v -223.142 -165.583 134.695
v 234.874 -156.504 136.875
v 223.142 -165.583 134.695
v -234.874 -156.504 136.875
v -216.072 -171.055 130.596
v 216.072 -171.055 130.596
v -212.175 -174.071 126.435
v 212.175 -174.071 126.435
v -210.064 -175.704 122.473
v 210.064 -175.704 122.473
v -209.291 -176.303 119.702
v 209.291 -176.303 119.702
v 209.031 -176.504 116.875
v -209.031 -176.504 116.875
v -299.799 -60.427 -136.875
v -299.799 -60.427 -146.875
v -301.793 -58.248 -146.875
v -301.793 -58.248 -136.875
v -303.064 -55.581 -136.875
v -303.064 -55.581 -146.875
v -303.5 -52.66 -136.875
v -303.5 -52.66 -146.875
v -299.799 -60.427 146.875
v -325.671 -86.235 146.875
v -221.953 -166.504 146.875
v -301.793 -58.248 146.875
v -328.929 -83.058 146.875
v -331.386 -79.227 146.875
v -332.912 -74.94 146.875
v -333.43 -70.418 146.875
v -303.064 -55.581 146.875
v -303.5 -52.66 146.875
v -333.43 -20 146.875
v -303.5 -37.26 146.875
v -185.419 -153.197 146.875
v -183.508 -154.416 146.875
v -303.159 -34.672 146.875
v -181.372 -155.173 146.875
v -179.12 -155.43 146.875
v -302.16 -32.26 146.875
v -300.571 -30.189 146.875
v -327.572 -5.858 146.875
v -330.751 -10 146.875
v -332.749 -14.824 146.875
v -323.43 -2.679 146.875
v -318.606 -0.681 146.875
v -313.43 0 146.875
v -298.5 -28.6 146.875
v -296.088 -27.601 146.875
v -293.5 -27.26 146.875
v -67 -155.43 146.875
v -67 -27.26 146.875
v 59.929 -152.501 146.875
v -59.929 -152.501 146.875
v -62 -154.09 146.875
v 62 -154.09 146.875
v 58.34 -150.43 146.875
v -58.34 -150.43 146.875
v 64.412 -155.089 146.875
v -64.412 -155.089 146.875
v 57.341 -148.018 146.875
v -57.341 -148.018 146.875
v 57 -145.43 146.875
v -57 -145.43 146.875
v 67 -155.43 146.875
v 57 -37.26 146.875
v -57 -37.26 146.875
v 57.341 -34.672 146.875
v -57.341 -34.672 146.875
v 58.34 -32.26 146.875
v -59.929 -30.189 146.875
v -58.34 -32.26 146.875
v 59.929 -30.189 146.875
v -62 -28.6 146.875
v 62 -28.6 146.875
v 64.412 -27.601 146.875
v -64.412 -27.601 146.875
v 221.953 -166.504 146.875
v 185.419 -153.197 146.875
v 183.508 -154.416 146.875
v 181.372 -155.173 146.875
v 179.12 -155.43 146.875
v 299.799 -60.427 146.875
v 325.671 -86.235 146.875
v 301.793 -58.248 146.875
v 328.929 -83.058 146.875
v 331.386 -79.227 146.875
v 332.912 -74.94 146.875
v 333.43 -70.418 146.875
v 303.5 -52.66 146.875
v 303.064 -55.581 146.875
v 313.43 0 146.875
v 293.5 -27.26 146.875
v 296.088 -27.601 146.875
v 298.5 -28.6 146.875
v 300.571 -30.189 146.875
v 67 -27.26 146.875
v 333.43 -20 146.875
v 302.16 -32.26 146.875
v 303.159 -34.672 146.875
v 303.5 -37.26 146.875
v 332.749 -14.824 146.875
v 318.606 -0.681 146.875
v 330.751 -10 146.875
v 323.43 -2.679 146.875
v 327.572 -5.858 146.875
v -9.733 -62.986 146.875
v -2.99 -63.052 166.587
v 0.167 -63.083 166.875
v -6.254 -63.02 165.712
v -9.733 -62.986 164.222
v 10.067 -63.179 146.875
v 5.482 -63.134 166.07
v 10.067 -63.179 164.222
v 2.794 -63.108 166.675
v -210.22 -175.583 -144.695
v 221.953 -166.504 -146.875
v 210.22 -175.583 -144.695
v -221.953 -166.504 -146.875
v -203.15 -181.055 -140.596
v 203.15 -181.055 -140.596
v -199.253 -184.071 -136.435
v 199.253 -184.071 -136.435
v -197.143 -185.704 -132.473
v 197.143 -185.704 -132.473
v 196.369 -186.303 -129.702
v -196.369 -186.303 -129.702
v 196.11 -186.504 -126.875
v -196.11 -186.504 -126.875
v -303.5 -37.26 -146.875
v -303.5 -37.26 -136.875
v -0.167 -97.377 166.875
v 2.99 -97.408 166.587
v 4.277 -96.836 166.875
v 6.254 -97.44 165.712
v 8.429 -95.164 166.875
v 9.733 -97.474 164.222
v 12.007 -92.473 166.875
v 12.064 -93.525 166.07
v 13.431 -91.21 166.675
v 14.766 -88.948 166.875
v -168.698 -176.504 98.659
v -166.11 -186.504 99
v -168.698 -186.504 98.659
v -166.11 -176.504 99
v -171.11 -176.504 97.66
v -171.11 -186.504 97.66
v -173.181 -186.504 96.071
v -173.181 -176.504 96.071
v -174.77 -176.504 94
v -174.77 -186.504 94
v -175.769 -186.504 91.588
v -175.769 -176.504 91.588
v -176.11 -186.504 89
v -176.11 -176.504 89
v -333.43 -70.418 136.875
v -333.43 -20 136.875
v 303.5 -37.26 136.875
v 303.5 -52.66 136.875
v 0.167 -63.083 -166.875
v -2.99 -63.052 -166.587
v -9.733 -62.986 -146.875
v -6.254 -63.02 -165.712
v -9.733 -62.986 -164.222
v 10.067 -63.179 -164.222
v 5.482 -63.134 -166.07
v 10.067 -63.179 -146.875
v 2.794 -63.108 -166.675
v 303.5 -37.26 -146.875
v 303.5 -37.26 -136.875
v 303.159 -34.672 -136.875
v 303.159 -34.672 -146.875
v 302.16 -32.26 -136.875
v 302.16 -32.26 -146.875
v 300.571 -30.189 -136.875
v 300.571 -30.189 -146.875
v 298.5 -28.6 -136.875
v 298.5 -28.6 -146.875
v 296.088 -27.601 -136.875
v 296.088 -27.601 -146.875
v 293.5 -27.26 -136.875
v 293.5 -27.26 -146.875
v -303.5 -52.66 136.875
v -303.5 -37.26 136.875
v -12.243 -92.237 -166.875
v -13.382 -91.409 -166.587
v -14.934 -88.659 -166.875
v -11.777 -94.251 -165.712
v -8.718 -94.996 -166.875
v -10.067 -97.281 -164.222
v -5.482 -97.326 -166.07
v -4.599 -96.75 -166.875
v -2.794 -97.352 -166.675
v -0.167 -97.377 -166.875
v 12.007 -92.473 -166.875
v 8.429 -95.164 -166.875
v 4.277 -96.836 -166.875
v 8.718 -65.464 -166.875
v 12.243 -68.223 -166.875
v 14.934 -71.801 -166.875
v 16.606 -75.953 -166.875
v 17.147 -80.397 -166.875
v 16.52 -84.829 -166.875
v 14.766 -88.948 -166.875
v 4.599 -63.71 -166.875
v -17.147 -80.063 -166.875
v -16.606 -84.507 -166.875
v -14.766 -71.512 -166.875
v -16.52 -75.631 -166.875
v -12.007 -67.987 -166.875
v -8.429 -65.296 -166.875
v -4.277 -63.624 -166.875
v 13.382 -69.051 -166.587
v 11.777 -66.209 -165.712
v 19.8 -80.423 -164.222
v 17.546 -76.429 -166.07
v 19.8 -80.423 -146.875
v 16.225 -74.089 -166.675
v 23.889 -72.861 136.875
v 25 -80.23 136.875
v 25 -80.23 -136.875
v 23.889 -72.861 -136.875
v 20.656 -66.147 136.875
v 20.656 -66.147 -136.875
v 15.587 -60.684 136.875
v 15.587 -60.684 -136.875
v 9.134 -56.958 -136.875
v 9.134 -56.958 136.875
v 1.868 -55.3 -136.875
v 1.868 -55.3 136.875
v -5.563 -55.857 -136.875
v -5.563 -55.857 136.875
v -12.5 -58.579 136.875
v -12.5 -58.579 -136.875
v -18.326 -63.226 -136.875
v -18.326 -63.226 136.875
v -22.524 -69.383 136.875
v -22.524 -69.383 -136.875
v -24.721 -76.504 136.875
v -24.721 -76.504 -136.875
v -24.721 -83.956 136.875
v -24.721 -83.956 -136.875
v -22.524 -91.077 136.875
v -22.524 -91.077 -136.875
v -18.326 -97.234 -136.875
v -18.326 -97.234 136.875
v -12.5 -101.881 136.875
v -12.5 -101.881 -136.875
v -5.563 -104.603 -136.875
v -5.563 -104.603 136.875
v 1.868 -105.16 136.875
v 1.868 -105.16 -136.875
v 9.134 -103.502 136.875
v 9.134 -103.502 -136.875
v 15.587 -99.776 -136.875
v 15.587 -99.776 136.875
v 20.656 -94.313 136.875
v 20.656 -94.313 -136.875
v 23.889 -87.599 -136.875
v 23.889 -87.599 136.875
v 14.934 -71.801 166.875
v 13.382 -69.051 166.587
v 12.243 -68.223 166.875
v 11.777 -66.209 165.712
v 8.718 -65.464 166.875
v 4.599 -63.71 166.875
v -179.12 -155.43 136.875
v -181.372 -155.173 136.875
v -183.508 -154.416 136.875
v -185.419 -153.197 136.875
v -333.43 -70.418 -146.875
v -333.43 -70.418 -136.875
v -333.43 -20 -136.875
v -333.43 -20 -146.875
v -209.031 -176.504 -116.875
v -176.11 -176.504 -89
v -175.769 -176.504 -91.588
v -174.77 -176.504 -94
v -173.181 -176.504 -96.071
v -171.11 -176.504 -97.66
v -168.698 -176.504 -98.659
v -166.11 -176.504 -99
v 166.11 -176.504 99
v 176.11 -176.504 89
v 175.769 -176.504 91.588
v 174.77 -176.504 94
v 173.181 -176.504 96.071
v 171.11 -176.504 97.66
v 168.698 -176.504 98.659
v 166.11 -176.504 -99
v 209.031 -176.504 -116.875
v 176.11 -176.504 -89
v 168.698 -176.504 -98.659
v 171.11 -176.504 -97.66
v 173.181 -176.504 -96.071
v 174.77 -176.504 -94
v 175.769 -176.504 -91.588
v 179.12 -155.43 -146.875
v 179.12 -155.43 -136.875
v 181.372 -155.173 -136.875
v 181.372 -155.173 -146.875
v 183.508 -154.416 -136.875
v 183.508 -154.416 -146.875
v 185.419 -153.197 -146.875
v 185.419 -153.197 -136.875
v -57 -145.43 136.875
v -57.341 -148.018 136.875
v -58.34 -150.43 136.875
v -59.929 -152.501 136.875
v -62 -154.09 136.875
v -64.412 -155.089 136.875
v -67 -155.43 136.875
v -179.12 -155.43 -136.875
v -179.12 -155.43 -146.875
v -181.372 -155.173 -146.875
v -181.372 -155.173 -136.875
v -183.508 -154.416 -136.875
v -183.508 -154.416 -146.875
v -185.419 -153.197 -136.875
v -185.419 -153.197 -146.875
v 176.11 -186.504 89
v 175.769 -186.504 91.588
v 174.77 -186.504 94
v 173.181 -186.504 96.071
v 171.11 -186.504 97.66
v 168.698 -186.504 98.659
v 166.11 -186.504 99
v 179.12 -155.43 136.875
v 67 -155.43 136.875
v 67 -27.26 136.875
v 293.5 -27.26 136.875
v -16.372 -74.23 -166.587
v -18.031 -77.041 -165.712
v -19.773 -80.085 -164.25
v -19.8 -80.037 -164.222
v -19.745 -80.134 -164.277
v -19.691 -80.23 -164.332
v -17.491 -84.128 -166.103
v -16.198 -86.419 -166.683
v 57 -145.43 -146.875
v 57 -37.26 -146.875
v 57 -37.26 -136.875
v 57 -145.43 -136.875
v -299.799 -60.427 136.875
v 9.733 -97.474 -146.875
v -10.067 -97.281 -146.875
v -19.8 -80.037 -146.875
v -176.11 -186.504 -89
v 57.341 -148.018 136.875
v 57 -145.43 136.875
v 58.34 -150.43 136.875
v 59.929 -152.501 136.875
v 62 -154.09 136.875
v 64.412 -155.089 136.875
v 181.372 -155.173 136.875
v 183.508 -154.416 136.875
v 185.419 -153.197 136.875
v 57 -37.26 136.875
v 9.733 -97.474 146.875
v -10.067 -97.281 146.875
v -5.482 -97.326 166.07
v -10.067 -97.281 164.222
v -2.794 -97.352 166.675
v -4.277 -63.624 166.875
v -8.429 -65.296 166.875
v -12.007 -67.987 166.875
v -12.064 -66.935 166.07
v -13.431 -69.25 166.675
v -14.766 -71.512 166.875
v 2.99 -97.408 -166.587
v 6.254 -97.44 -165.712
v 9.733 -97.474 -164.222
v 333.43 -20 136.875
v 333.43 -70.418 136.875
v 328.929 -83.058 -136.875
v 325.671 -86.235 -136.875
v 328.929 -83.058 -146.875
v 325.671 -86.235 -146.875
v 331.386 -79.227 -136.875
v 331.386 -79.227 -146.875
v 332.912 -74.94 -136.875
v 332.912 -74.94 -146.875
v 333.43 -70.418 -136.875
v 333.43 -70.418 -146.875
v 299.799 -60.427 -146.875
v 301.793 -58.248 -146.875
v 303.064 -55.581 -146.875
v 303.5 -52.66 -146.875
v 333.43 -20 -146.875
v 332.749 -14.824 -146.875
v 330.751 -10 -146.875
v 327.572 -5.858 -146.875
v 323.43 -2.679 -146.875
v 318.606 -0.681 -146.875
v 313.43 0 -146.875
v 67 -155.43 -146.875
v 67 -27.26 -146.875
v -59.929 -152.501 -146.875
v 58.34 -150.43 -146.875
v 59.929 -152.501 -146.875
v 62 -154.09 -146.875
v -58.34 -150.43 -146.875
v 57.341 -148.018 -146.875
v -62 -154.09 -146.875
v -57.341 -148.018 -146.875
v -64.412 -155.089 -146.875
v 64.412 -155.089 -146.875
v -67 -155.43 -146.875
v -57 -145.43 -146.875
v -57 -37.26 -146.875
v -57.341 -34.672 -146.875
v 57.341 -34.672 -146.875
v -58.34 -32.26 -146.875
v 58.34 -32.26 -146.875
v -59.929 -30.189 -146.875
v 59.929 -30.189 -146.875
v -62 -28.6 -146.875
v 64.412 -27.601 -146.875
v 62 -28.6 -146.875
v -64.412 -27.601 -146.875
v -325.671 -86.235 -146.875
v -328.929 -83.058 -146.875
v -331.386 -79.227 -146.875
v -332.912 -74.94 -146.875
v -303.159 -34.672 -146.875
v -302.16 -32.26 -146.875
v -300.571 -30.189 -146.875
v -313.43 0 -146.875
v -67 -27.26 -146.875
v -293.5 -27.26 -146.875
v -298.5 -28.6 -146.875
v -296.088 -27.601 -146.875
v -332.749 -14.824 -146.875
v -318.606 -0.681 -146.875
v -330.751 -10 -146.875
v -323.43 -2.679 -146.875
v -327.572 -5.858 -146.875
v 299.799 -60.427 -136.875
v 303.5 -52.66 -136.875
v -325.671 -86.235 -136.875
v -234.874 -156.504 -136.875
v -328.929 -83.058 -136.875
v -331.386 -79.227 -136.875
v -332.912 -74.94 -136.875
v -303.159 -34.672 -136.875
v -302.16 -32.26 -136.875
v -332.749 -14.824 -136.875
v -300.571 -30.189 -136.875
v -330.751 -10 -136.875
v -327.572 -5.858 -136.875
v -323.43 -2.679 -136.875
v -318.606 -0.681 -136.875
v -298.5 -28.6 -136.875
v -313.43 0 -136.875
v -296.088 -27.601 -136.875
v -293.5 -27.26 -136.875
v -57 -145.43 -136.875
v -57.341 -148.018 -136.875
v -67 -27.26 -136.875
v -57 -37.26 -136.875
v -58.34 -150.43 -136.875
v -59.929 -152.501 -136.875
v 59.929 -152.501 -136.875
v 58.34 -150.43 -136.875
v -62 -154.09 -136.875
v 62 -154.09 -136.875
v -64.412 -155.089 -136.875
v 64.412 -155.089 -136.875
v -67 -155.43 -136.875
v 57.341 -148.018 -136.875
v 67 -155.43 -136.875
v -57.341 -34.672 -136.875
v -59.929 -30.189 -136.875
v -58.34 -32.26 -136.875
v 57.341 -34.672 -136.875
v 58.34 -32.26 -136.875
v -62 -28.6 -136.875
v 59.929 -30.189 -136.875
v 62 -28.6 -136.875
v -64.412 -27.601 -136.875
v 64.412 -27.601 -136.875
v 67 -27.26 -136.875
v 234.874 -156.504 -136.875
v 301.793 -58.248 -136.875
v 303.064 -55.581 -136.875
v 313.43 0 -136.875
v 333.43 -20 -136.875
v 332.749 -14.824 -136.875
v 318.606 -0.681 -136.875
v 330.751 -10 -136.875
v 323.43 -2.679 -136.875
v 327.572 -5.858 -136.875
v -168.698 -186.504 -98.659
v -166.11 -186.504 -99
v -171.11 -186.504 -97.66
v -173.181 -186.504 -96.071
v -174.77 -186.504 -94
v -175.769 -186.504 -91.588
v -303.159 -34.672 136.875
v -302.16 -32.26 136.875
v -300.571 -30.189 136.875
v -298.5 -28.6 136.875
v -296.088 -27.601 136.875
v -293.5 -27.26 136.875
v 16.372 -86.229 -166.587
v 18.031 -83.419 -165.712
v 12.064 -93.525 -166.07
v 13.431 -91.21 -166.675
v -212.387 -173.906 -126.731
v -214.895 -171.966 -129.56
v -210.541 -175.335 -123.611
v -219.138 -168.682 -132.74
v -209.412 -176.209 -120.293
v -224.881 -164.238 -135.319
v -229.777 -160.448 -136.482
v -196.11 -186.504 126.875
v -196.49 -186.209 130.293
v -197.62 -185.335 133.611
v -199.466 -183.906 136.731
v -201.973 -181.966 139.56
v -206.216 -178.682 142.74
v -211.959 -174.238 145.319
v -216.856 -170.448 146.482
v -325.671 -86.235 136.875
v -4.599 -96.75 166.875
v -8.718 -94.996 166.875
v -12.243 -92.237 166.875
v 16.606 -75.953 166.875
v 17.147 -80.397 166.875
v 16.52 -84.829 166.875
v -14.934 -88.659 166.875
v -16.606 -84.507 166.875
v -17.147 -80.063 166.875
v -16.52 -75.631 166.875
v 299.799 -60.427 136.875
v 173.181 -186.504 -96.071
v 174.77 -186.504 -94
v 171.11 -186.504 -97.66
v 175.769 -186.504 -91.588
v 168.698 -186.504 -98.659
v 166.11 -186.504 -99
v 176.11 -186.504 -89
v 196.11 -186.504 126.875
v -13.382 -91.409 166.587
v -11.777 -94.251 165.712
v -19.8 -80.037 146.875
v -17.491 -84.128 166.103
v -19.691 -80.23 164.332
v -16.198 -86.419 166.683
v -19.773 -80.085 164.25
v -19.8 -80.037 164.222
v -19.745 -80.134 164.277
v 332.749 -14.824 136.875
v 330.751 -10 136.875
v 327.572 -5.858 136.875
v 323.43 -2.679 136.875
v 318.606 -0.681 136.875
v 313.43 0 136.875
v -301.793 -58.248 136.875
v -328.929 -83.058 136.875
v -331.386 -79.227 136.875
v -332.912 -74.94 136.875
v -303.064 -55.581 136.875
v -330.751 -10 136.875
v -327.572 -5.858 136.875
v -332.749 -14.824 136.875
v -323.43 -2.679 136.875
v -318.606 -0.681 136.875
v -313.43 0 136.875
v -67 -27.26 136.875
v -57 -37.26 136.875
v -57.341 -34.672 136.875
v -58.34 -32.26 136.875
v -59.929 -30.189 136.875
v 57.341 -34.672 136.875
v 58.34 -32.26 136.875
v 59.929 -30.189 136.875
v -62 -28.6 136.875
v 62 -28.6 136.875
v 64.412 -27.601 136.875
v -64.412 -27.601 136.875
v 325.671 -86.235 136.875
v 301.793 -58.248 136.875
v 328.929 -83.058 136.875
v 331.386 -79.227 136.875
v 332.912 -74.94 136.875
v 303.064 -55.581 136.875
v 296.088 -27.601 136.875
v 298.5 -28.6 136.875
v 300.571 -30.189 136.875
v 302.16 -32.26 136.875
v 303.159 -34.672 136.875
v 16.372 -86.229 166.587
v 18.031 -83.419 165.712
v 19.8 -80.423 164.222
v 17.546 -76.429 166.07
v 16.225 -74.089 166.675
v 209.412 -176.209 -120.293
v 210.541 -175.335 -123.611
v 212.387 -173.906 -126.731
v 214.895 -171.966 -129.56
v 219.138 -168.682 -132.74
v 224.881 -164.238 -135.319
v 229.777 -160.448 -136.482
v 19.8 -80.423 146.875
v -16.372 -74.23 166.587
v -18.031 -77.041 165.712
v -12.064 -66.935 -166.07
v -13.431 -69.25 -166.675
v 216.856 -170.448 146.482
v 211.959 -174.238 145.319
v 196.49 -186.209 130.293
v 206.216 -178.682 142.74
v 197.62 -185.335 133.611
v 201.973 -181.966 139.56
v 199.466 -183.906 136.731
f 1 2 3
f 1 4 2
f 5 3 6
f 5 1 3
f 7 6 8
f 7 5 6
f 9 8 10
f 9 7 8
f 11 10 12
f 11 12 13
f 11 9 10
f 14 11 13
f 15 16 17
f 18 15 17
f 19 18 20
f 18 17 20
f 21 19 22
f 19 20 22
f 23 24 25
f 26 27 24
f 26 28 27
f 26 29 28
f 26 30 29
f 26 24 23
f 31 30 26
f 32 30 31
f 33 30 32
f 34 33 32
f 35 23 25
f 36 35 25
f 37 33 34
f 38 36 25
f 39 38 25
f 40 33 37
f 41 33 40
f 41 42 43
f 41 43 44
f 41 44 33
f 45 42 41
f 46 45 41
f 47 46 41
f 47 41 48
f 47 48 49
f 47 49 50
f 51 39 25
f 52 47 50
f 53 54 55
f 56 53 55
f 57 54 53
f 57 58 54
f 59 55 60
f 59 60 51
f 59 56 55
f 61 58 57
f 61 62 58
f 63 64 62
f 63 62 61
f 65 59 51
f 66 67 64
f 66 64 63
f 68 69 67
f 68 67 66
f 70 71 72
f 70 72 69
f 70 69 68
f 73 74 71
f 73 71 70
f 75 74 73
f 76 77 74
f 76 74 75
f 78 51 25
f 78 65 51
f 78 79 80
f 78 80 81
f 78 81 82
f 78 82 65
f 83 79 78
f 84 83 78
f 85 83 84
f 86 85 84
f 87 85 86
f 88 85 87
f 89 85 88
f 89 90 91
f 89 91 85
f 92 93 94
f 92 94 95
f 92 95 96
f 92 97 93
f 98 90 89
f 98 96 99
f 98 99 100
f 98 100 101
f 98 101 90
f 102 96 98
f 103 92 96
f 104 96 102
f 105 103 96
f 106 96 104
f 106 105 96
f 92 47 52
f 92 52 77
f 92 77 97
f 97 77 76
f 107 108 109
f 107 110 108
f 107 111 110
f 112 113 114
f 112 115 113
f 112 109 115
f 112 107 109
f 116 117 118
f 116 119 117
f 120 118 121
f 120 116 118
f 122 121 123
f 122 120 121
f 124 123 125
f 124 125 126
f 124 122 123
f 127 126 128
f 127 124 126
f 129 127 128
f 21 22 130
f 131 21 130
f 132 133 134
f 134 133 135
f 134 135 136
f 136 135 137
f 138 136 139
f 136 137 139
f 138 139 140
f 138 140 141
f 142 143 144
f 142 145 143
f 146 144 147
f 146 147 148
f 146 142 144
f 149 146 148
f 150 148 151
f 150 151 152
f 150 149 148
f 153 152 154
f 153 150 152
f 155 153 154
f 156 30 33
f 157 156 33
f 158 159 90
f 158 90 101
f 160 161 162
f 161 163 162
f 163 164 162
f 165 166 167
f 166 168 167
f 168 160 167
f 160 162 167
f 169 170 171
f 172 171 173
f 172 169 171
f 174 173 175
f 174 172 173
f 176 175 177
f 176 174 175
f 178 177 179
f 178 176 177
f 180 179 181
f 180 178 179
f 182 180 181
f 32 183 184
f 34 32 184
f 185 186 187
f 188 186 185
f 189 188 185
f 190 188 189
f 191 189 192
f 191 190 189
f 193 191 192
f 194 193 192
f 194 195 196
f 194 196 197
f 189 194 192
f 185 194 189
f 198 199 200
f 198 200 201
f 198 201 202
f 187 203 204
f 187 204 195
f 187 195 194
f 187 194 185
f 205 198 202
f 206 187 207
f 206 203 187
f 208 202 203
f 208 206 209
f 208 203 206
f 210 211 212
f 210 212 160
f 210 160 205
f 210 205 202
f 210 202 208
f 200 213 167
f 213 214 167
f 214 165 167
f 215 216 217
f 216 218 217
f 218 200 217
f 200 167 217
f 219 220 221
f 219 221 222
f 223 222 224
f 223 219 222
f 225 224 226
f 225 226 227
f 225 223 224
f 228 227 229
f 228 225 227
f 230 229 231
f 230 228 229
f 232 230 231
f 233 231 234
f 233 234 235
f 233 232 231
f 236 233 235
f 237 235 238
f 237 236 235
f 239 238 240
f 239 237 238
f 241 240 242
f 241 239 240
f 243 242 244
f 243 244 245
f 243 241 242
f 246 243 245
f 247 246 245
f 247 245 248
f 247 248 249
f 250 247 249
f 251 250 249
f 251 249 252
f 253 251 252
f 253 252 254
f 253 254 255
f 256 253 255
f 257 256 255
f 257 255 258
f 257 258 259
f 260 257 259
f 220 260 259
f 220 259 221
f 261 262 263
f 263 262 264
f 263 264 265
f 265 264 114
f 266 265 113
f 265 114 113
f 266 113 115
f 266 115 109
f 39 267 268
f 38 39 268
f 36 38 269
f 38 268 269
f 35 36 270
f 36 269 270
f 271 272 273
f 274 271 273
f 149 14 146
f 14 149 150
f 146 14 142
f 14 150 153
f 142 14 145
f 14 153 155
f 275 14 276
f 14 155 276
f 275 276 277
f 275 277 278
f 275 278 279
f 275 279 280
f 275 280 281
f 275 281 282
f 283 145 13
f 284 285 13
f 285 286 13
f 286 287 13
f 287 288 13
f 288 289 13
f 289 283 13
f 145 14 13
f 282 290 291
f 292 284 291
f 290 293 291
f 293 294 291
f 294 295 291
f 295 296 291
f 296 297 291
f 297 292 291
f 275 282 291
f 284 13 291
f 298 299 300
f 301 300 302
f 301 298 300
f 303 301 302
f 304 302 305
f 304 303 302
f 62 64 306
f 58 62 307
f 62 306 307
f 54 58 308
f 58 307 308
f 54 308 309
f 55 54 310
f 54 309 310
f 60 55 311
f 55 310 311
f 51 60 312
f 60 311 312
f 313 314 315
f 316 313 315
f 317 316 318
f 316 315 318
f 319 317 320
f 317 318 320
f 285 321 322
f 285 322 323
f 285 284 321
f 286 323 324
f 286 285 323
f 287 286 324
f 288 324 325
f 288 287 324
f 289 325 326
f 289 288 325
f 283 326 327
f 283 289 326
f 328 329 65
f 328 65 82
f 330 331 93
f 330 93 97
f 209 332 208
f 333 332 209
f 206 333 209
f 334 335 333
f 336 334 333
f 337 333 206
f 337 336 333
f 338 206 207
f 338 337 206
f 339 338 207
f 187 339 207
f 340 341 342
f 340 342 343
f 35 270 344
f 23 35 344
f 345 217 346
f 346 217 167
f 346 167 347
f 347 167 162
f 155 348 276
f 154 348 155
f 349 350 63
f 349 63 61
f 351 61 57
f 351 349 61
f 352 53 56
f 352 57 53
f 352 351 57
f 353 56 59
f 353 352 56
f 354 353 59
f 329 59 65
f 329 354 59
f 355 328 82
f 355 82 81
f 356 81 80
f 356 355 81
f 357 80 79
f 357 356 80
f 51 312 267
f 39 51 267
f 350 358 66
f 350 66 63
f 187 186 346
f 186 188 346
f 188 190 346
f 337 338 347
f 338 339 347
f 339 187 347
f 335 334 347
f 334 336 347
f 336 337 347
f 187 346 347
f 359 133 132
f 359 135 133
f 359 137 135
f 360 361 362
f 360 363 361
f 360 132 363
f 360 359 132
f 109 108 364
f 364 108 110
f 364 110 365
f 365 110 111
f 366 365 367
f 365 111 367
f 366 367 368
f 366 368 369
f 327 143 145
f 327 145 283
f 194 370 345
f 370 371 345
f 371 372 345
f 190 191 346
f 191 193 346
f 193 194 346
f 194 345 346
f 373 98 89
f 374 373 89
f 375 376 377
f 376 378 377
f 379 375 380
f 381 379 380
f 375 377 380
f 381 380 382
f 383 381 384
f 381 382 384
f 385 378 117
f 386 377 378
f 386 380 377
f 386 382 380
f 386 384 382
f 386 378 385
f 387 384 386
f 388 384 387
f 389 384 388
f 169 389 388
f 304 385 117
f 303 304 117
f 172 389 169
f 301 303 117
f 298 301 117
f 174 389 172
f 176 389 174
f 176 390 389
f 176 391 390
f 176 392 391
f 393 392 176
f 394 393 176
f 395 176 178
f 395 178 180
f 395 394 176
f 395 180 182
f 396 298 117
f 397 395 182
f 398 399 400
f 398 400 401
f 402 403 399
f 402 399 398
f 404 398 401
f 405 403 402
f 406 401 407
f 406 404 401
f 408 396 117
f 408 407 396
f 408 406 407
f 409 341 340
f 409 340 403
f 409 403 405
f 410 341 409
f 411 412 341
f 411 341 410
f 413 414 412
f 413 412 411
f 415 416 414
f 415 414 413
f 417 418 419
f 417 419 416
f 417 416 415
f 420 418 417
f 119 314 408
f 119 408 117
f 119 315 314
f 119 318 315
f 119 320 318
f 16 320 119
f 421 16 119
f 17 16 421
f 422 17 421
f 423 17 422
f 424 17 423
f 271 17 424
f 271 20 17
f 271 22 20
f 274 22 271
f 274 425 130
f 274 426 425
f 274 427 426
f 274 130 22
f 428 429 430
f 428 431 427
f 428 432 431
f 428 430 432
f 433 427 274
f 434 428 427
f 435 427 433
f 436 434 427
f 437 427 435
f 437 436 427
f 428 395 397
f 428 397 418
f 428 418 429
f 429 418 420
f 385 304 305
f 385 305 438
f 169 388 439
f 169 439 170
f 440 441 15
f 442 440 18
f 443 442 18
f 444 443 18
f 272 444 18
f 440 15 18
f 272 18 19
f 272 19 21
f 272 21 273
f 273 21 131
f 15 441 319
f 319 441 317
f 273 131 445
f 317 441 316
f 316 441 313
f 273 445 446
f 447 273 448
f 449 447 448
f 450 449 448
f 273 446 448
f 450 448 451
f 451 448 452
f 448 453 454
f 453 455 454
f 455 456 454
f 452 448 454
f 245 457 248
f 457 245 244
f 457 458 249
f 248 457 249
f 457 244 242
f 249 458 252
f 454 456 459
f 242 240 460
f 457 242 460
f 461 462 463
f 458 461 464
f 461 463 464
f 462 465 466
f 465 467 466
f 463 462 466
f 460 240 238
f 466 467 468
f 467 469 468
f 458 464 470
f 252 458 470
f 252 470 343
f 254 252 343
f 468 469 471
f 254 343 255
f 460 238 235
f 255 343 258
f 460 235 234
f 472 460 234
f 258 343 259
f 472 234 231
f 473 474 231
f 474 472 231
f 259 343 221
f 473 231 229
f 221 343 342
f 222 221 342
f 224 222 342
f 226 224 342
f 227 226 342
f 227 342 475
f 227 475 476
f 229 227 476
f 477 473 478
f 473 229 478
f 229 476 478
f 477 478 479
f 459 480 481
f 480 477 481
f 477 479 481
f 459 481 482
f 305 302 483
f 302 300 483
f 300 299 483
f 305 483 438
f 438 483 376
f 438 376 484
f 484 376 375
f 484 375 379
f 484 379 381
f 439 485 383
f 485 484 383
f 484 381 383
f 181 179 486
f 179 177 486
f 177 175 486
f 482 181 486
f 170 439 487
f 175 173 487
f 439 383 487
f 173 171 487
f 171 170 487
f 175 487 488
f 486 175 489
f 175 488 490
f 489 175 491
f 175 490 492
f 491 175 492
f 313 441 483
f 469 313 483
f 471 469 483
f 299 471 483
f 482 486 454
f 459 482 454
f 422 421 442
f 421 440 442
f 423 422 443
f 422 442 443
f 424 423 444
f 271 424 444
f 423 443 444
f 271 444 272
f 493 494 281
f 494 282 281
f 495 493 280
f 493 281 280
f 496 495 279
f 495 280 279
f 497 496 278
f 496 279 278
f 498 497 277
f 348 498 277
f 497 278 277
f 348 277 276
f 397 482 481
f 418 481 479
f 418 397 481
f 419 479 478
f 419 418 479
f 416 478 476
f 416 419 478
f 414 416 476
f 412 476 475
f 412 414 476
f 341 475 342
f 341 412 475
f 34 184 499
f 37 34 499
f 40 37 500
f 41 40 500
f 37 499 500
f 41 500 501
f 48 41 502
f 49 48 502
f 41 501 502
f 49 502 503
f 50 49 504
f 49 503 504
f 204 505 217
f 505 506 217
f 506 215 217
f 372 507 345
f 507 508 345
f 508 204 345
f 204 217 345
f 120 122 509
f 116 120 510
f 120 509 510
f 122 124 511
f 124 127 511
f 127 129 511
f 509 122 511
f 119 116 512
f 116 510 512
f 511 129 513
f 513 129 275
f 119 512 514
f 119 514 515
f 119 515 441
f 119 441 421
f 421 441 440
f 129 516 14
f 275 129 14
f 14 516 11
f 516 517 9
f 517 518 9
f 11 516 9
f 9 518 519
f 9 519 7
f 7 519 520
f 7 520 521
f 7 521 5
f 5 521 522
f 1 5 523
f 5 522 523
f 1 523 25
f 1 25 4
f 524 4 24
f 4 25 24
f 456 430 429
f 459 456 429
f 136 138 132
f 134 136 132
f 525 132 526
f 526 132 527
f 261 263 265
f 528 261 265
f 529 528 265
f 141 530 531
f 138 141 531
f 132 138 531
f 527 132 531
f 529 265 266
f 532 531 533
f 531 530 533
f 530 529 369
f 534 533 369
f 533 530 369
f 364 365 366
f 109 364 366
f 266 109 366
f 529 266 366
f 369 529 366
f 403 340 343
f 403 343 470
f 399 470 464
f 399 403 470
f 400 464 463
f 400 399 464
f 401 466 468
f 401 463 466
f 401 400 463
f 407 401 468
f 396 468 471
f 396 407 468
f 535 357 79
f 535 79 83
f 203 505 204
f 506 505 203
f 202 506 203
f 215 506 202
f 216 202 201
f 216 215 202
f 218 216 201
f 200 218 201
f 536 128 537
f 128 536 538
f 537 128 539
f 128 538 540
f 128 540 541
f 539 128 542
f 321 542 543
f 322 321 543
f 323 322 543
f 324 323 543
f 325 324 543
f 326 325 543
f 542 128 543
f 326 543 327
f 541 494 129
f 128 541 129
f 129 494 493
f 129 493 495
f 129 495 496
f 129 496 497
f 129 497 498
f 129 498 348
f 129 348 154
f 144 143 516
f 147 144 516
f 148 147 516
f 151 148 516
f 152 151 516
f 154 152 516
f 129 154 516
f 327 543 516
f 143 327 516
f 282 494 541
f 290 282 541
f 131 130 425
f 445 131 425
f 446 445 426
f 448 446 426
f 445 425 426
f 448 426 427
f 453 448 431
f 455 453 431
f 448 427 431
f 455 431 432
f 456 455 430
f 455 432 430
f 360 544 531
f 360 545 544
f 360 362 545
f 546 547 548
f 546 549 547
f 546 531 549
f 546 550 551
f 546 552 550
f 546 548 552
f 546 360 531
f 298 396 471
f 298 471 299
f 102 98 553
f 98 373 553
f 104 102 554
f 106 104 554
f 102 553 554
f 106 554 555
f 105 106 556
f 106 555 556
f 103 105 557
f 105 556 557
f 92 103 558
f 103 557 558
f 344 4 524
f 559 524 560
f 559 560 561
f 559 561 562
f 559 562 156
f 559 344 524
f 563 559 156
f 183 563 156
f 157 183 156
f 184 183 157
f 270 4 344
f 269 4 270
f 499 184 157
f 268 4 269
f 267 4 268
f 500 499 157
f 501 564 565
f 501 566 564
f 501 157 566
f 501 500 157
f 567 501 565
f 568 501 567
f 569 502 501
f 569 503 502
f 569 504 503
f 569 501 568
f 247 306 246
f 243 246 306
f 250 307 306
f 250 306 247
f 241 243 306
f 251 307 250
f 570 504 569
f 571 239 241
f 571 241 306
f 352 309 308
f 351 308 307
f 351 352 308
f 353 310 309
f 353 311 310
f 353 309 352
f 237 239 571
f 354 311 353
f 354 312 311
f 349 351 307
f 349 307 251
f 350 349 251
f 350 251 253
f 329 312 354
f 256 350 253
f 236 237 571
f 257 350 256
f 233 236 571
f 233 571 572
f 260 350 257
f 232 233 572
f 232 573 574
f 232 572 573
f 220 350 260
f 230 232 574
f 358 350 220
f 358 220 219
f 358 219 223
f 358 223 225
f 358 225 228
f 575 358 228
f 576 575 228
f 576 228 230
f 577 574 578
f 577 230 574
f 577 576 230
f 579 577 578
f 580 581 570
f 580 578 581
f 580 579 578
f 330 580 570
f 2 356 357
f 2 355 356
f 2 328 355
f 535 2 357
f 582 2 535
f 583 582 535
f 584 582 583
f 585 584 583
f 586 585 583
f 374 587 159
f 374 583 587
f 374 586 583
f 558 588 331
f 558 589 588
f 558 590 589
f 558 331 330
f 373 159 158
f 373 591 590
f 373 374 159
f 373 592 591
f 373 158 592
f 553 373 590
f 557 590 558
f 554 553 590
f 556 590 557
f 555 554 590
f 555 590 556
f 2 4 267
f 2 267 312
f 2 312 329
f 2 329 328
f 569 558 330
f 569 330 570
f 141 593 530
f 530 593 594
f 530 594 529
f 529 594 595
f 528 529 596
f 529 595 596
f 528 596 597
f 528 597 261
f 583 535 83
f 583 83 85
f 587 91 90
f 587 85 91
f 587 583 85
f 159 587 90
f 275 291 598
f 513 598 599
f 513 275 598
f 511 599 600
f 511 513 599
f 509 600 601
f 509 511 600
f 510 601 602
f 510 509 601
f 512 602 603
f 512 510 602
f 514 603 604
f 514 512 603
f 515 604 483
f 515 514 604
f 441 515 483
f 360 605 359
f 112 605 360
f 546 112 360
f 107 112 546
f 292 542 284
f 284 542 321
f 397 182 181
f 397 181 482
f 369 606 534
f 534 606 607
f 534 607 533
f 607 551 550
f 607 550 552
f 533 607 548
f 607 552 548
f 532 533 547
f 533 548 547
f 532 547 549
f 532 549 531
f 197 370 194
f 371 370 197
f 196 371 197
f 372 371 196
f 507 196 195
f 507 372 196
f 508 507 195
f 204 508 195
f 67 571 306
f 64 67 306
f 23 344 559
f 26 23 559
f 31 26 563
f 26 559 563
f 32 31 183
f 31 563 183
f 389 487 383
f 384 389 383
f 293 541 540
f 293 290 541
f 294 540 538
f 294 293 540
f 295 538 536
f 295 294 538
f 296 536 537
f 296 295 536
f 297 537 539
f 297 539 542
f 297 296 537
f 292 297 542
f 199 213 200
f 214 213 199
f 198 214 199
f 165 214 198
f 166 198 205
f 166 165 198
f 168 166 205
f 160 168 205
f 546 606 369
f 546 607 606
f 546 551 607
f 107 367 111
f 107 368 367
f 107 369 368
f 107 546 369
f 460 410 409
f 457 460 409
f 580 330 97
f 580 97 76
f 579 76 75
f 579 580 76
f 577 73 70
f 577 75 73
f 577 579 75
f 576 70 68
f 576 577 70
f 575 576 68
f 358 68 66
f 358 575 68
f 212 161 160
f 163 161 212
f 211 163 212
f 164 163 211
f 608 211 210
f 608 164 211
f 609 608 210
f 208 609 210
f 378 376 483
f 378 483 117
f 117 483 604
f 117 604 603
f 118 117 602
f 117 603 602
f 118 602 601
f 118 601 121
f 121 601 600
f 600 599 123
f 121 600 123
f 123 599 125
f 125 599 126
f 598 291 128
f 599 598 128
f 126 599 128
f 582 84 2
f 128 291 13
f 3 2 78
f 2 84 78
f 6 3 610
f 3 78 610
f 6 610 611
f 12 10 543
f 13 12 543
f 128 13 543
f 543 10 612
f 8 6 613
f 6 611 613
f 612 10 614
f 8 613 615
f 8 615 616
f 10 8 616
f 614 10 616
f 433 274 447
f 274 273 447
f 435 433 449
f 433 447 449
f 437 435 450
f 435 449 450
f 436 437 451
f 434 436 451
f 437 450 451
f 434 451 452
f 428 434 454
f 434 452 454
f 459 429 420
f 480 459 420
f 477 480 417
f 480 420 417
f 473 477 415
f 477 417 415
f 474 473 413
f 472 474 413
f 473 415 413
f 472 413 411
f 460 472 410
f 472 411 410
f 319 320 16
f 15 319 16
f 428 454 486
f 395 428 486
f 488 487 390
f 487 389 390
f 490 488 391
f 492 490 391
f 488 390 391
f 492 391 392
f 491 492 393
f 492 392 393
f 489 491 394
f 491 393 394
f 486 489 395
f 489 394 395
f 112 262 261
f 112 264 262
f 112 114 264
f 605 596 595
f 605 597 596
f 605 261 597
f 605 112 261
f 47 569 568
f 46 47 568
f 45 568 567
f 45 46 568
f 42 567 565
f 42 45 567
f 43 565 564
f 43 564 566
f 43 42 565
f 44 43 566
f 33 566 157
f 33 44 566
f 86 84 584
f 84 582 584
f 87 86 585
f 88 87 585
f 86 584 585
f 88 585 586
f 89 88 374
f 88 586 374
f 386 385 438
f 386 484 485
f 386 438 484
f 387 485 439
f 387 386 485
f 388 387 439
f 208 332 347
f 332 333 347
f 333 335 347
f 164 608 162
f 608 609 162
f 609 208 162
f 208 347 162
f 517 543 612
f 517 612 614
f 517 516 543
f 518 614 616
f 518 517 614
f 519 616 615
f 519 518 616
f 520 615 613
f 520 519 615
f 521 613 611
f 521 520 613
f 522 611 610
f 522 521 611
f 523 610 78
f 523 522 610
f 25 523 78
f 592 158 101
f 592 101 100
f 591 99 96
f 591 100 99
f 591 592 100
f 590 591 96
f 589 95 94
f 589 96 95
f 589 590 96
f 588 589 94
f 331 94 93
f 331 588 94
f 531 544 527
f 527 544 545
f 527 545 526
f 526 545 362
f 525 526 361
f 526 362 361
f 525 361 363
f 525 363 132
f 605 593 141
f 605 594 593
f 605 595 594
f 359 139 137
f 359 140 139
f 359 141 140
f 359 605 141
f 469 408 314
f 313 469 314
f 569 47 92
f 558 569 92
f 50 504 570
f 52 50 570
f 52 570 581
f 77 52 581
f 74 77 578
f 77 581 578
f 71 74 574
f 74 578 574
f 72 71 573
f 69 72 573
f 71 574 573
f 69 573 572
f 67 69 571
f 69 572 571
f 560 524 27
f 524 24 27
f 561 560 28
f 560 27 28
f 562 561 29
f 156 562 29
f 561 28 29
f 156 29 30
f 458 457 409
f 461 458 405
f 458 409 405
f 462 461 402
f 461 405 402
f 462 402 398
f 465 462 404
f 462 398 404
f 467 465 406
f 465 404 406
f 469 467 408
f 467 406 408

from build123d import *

# Parameters (mm, degrees)
BOSS_EXTRUDE1_DEPTH = 146.875
SKETCH2_W           = 273.75
SKETCH2_H           = 192.54709784
CUT_EXTRUDE1_DEPTH  = 708.854574743
FILLET1_R           = 20
FILLET2_R           = 20
SKETCH3_R           = 25
BOSS_EXTRUDE2_DEPTH = 283.75
BOSS_EXTRUDE3_DEPTH = 20
SKETCH5_R           = 27.786582849
SKETCH5_R_2         = 17.148117484
CUT_EXTRUDE3_DEPTH  = 20
CUT_EXTRUDE3_TAPER  = 45
CUT_EXTRUDE4_DEPTH  = 495.366464437
SKETCH8_W           = 352.22
SKETCH8_H           = 198
CUT_EXTRUDE5_DEPTH  = 20
FILLET3_R           = 20
FILLET4_R           = 10


with BuildPart() as part:
    # Sketch1 → Boss-Extrude1 (new, symmetric)
    with BuildSketch(Plane.XY):
        Polygon((-333.43, 0), (333.43, 0), (333.43, -80.23), (196.11, -186.50354892), (-196.11, -186.50354892), (-333.43, -80.23), align=None)
    extrude(amount=BOSS_EXTRUDE1_DEPTH, both=True)

    # Sketch2 → Cut-Extrude1 (cut, through all)
    with BuildSketch(Plane(origin=(333.43, 0, 0), x_dir=(0, 0, -1), z_dir=(1, 0, 0))):
        with Locations((0, -80.23)):
            Rectangle(SKETCH2_W, SKETCH2_H)
    extrude(amount=-CUT_EXTRUDE1_DEPTH, mode=Mode.SUBTRACT)

    # Fillet1
    fillet1_edges = [part.edges().sort_by_distance(p)[0] for p in [
        (0, -186.50354892, 146.875),
        (0, -186.50354892, -146.875),
    ]]
    fillet(fillet1_edges, radius=FILLET1_R)

    # Fillet2
    fillet2_edges = [part.edges().sort_by_distance(p)[0] for p in [
        (0, -176.50354892, -136.875),
        (0, -176.50354892, 136.875),
    ]]
    fillet(fillet2_edges, radius=FILLET2_R)

    # Sketch3 → Boss-Extrude2 (add)
    with BuildSketch(Plane.XY.offset(146.875)):
        with Locations((0, -80.23)):
            Circle(SKETCH3_R)
    extrude(amount=-BOSS_EXTRUDE2_DEPTH)

    # Sketch6 → Cut-Extrude4 (cut, through all)
    with BuildSketch(Plane(origin=(0, 0, -146.875), x_dir=(-1, 0, 0), z_dir=(0, 0, -1))):
        with BuildLine():
            Line((-303.5, -52.66), (-303.5, -37.26))
            ThreePointArc((-303.5, -37.26), (-300.571067812, -30.188932188), (-293.5, -27.26))
            Line((-293.5, -27.26), (-67, -27.26))
            ThreePointArc((-67, -27.26), (-59.928932188, -30.188932188), (-57, -37.26))
            Line((-57, -37.26), (-57, -145.43))
            ThreePointArc((-57, -145.43), (-59.928932188, -152.501067812), (-67, -155.43))
            Line((-67, -155.43), (-179.12, -155.43))
            ThreePointArc((-179.12, -155.43), (-182.461721995, -154.855120376), (-185.419226414, -153.196578821))
            Line((-185.419226414, -153.196578821), (-299.799226414, -60.426578821))
            ThreePointArc((-299.799226414, -60.426578821), (-302.527520815, -56.961612248), (-303.5, -52.66))
        make_face()
        with BuildLine():
            Line((67, -155.43), (179.12, -155.43))
            ThreePointArc((179.12, -155.43), (182.461721995, -154.855120376), (185.419226414, -153.196578821))
            Line((185.419226414, -153.196578821), (299.799226414, -60.426578821))
            ThreePointArc((299.799226414, -60.426578821), (302.527520815, -56.961612248), (303.5, -52.66))
            Line((303.5, -52.66), (303.5, -37.26))
            ThreePointArc((303.5, -37.26), (300.571067812, -30.188932188), (293.5, -27.26))
            Line((293.5, -27.26), (67, -27.26))
            ThreePointArc((67, -27.26), (59.928932188, -30.188932188), (57, -37.26))
            Line((57, -37.26), (57, -145.43))
            ThreePointArc((57, -145.43), (59.928932188, -152.501067812), (67, -155.43))
        make_face()
    extrude(amount=-CUT_EXTRUDE4_DEPTH, mode=Mode.SUBTRACT)

    # Sketch8 → Cut-Extrude5 (cut)
    with BuildSketch(Plane.XZ.offset(186.50354892)):
        Rectangle(SKETCH8_W, SKETCH8_H)
    extrude(amount=-CUT_EXTRUDE5_DEPTH, mode=Mode.SUBTRACT)

    # Fillet3
    fillet3_edges = [part.edges().sort_by_distance(p)[0] for p in [
        (333.43, -80.23, 141.875),
        (-333.43, -80.23, 141.875),
        (-333.43, 0, 141.875),
        (333.43, 0, 141.875),
        (333.43, -80.23, -141.875),
        (-333.43, -80.23, -141.875),
        (-333.43, 0, -141.875),
        (333.43, 0, -141.875),
    ]]
    fillet(fillet3_edges, radius=FILLET3_R)

    # Fillet4
    fillet4_edges = [part.edges().sort_by_distance(p)[0] for p in [
        (176.11, -181.50354892, 99),
        (176.11, -181.50354892, -99),
        (-176.11, -181.50354892, -99),
        (-176.11, -181.50354892, 99),
    ]]
    fillet(fillet4_edges, radius=FILLET4_R)


with BuildPart() as body_2:
    # Sketch4 → Boss-Extrude3 (new body)
    with BuildSketch(Plane(origin=(0, 0, -146.875), x_dir=(-1, 0, 0), z_dir=(0, 0, -1))):
        Polygon((9.732867587, -62.986203061), (-10.067132413, -63.179190949), (-19.8, -80.422987887), (-9.732867587, -97.473796939), (10.067132413, -97.280809051), (19.8, -80.037012113), align=None)
    extrude(amount=BOSS_EXTRUDE3_DEPTH)

    # Sketch5 → Cut-Extrude3 (cut)
    with BuildSketch(Plane(origin=(0, 0, -166.875), x_dir=(-1, 0, 0), z_dir=(0, 0, -1))):
        with Locations((0, -80.23)):
            Circle(SKETCH5_R)
        with Locations((0, -80.23)):
            Circle(SKETCH5_R_2, mode=Mode.SUBTRACT)
    extrude(amount=-CUT_EXTRUDE3_DEPTH, taper=CUT_EXTRUDE3_TAPER, mode=Mode.SUBTRACT)


with BuildPart() as body_3:
    # Mirror1: mirrored copy
    add(body_2.part.mirror(Plane.XY))


solid = Compound([part.part, body_2.part, body_3.part])
